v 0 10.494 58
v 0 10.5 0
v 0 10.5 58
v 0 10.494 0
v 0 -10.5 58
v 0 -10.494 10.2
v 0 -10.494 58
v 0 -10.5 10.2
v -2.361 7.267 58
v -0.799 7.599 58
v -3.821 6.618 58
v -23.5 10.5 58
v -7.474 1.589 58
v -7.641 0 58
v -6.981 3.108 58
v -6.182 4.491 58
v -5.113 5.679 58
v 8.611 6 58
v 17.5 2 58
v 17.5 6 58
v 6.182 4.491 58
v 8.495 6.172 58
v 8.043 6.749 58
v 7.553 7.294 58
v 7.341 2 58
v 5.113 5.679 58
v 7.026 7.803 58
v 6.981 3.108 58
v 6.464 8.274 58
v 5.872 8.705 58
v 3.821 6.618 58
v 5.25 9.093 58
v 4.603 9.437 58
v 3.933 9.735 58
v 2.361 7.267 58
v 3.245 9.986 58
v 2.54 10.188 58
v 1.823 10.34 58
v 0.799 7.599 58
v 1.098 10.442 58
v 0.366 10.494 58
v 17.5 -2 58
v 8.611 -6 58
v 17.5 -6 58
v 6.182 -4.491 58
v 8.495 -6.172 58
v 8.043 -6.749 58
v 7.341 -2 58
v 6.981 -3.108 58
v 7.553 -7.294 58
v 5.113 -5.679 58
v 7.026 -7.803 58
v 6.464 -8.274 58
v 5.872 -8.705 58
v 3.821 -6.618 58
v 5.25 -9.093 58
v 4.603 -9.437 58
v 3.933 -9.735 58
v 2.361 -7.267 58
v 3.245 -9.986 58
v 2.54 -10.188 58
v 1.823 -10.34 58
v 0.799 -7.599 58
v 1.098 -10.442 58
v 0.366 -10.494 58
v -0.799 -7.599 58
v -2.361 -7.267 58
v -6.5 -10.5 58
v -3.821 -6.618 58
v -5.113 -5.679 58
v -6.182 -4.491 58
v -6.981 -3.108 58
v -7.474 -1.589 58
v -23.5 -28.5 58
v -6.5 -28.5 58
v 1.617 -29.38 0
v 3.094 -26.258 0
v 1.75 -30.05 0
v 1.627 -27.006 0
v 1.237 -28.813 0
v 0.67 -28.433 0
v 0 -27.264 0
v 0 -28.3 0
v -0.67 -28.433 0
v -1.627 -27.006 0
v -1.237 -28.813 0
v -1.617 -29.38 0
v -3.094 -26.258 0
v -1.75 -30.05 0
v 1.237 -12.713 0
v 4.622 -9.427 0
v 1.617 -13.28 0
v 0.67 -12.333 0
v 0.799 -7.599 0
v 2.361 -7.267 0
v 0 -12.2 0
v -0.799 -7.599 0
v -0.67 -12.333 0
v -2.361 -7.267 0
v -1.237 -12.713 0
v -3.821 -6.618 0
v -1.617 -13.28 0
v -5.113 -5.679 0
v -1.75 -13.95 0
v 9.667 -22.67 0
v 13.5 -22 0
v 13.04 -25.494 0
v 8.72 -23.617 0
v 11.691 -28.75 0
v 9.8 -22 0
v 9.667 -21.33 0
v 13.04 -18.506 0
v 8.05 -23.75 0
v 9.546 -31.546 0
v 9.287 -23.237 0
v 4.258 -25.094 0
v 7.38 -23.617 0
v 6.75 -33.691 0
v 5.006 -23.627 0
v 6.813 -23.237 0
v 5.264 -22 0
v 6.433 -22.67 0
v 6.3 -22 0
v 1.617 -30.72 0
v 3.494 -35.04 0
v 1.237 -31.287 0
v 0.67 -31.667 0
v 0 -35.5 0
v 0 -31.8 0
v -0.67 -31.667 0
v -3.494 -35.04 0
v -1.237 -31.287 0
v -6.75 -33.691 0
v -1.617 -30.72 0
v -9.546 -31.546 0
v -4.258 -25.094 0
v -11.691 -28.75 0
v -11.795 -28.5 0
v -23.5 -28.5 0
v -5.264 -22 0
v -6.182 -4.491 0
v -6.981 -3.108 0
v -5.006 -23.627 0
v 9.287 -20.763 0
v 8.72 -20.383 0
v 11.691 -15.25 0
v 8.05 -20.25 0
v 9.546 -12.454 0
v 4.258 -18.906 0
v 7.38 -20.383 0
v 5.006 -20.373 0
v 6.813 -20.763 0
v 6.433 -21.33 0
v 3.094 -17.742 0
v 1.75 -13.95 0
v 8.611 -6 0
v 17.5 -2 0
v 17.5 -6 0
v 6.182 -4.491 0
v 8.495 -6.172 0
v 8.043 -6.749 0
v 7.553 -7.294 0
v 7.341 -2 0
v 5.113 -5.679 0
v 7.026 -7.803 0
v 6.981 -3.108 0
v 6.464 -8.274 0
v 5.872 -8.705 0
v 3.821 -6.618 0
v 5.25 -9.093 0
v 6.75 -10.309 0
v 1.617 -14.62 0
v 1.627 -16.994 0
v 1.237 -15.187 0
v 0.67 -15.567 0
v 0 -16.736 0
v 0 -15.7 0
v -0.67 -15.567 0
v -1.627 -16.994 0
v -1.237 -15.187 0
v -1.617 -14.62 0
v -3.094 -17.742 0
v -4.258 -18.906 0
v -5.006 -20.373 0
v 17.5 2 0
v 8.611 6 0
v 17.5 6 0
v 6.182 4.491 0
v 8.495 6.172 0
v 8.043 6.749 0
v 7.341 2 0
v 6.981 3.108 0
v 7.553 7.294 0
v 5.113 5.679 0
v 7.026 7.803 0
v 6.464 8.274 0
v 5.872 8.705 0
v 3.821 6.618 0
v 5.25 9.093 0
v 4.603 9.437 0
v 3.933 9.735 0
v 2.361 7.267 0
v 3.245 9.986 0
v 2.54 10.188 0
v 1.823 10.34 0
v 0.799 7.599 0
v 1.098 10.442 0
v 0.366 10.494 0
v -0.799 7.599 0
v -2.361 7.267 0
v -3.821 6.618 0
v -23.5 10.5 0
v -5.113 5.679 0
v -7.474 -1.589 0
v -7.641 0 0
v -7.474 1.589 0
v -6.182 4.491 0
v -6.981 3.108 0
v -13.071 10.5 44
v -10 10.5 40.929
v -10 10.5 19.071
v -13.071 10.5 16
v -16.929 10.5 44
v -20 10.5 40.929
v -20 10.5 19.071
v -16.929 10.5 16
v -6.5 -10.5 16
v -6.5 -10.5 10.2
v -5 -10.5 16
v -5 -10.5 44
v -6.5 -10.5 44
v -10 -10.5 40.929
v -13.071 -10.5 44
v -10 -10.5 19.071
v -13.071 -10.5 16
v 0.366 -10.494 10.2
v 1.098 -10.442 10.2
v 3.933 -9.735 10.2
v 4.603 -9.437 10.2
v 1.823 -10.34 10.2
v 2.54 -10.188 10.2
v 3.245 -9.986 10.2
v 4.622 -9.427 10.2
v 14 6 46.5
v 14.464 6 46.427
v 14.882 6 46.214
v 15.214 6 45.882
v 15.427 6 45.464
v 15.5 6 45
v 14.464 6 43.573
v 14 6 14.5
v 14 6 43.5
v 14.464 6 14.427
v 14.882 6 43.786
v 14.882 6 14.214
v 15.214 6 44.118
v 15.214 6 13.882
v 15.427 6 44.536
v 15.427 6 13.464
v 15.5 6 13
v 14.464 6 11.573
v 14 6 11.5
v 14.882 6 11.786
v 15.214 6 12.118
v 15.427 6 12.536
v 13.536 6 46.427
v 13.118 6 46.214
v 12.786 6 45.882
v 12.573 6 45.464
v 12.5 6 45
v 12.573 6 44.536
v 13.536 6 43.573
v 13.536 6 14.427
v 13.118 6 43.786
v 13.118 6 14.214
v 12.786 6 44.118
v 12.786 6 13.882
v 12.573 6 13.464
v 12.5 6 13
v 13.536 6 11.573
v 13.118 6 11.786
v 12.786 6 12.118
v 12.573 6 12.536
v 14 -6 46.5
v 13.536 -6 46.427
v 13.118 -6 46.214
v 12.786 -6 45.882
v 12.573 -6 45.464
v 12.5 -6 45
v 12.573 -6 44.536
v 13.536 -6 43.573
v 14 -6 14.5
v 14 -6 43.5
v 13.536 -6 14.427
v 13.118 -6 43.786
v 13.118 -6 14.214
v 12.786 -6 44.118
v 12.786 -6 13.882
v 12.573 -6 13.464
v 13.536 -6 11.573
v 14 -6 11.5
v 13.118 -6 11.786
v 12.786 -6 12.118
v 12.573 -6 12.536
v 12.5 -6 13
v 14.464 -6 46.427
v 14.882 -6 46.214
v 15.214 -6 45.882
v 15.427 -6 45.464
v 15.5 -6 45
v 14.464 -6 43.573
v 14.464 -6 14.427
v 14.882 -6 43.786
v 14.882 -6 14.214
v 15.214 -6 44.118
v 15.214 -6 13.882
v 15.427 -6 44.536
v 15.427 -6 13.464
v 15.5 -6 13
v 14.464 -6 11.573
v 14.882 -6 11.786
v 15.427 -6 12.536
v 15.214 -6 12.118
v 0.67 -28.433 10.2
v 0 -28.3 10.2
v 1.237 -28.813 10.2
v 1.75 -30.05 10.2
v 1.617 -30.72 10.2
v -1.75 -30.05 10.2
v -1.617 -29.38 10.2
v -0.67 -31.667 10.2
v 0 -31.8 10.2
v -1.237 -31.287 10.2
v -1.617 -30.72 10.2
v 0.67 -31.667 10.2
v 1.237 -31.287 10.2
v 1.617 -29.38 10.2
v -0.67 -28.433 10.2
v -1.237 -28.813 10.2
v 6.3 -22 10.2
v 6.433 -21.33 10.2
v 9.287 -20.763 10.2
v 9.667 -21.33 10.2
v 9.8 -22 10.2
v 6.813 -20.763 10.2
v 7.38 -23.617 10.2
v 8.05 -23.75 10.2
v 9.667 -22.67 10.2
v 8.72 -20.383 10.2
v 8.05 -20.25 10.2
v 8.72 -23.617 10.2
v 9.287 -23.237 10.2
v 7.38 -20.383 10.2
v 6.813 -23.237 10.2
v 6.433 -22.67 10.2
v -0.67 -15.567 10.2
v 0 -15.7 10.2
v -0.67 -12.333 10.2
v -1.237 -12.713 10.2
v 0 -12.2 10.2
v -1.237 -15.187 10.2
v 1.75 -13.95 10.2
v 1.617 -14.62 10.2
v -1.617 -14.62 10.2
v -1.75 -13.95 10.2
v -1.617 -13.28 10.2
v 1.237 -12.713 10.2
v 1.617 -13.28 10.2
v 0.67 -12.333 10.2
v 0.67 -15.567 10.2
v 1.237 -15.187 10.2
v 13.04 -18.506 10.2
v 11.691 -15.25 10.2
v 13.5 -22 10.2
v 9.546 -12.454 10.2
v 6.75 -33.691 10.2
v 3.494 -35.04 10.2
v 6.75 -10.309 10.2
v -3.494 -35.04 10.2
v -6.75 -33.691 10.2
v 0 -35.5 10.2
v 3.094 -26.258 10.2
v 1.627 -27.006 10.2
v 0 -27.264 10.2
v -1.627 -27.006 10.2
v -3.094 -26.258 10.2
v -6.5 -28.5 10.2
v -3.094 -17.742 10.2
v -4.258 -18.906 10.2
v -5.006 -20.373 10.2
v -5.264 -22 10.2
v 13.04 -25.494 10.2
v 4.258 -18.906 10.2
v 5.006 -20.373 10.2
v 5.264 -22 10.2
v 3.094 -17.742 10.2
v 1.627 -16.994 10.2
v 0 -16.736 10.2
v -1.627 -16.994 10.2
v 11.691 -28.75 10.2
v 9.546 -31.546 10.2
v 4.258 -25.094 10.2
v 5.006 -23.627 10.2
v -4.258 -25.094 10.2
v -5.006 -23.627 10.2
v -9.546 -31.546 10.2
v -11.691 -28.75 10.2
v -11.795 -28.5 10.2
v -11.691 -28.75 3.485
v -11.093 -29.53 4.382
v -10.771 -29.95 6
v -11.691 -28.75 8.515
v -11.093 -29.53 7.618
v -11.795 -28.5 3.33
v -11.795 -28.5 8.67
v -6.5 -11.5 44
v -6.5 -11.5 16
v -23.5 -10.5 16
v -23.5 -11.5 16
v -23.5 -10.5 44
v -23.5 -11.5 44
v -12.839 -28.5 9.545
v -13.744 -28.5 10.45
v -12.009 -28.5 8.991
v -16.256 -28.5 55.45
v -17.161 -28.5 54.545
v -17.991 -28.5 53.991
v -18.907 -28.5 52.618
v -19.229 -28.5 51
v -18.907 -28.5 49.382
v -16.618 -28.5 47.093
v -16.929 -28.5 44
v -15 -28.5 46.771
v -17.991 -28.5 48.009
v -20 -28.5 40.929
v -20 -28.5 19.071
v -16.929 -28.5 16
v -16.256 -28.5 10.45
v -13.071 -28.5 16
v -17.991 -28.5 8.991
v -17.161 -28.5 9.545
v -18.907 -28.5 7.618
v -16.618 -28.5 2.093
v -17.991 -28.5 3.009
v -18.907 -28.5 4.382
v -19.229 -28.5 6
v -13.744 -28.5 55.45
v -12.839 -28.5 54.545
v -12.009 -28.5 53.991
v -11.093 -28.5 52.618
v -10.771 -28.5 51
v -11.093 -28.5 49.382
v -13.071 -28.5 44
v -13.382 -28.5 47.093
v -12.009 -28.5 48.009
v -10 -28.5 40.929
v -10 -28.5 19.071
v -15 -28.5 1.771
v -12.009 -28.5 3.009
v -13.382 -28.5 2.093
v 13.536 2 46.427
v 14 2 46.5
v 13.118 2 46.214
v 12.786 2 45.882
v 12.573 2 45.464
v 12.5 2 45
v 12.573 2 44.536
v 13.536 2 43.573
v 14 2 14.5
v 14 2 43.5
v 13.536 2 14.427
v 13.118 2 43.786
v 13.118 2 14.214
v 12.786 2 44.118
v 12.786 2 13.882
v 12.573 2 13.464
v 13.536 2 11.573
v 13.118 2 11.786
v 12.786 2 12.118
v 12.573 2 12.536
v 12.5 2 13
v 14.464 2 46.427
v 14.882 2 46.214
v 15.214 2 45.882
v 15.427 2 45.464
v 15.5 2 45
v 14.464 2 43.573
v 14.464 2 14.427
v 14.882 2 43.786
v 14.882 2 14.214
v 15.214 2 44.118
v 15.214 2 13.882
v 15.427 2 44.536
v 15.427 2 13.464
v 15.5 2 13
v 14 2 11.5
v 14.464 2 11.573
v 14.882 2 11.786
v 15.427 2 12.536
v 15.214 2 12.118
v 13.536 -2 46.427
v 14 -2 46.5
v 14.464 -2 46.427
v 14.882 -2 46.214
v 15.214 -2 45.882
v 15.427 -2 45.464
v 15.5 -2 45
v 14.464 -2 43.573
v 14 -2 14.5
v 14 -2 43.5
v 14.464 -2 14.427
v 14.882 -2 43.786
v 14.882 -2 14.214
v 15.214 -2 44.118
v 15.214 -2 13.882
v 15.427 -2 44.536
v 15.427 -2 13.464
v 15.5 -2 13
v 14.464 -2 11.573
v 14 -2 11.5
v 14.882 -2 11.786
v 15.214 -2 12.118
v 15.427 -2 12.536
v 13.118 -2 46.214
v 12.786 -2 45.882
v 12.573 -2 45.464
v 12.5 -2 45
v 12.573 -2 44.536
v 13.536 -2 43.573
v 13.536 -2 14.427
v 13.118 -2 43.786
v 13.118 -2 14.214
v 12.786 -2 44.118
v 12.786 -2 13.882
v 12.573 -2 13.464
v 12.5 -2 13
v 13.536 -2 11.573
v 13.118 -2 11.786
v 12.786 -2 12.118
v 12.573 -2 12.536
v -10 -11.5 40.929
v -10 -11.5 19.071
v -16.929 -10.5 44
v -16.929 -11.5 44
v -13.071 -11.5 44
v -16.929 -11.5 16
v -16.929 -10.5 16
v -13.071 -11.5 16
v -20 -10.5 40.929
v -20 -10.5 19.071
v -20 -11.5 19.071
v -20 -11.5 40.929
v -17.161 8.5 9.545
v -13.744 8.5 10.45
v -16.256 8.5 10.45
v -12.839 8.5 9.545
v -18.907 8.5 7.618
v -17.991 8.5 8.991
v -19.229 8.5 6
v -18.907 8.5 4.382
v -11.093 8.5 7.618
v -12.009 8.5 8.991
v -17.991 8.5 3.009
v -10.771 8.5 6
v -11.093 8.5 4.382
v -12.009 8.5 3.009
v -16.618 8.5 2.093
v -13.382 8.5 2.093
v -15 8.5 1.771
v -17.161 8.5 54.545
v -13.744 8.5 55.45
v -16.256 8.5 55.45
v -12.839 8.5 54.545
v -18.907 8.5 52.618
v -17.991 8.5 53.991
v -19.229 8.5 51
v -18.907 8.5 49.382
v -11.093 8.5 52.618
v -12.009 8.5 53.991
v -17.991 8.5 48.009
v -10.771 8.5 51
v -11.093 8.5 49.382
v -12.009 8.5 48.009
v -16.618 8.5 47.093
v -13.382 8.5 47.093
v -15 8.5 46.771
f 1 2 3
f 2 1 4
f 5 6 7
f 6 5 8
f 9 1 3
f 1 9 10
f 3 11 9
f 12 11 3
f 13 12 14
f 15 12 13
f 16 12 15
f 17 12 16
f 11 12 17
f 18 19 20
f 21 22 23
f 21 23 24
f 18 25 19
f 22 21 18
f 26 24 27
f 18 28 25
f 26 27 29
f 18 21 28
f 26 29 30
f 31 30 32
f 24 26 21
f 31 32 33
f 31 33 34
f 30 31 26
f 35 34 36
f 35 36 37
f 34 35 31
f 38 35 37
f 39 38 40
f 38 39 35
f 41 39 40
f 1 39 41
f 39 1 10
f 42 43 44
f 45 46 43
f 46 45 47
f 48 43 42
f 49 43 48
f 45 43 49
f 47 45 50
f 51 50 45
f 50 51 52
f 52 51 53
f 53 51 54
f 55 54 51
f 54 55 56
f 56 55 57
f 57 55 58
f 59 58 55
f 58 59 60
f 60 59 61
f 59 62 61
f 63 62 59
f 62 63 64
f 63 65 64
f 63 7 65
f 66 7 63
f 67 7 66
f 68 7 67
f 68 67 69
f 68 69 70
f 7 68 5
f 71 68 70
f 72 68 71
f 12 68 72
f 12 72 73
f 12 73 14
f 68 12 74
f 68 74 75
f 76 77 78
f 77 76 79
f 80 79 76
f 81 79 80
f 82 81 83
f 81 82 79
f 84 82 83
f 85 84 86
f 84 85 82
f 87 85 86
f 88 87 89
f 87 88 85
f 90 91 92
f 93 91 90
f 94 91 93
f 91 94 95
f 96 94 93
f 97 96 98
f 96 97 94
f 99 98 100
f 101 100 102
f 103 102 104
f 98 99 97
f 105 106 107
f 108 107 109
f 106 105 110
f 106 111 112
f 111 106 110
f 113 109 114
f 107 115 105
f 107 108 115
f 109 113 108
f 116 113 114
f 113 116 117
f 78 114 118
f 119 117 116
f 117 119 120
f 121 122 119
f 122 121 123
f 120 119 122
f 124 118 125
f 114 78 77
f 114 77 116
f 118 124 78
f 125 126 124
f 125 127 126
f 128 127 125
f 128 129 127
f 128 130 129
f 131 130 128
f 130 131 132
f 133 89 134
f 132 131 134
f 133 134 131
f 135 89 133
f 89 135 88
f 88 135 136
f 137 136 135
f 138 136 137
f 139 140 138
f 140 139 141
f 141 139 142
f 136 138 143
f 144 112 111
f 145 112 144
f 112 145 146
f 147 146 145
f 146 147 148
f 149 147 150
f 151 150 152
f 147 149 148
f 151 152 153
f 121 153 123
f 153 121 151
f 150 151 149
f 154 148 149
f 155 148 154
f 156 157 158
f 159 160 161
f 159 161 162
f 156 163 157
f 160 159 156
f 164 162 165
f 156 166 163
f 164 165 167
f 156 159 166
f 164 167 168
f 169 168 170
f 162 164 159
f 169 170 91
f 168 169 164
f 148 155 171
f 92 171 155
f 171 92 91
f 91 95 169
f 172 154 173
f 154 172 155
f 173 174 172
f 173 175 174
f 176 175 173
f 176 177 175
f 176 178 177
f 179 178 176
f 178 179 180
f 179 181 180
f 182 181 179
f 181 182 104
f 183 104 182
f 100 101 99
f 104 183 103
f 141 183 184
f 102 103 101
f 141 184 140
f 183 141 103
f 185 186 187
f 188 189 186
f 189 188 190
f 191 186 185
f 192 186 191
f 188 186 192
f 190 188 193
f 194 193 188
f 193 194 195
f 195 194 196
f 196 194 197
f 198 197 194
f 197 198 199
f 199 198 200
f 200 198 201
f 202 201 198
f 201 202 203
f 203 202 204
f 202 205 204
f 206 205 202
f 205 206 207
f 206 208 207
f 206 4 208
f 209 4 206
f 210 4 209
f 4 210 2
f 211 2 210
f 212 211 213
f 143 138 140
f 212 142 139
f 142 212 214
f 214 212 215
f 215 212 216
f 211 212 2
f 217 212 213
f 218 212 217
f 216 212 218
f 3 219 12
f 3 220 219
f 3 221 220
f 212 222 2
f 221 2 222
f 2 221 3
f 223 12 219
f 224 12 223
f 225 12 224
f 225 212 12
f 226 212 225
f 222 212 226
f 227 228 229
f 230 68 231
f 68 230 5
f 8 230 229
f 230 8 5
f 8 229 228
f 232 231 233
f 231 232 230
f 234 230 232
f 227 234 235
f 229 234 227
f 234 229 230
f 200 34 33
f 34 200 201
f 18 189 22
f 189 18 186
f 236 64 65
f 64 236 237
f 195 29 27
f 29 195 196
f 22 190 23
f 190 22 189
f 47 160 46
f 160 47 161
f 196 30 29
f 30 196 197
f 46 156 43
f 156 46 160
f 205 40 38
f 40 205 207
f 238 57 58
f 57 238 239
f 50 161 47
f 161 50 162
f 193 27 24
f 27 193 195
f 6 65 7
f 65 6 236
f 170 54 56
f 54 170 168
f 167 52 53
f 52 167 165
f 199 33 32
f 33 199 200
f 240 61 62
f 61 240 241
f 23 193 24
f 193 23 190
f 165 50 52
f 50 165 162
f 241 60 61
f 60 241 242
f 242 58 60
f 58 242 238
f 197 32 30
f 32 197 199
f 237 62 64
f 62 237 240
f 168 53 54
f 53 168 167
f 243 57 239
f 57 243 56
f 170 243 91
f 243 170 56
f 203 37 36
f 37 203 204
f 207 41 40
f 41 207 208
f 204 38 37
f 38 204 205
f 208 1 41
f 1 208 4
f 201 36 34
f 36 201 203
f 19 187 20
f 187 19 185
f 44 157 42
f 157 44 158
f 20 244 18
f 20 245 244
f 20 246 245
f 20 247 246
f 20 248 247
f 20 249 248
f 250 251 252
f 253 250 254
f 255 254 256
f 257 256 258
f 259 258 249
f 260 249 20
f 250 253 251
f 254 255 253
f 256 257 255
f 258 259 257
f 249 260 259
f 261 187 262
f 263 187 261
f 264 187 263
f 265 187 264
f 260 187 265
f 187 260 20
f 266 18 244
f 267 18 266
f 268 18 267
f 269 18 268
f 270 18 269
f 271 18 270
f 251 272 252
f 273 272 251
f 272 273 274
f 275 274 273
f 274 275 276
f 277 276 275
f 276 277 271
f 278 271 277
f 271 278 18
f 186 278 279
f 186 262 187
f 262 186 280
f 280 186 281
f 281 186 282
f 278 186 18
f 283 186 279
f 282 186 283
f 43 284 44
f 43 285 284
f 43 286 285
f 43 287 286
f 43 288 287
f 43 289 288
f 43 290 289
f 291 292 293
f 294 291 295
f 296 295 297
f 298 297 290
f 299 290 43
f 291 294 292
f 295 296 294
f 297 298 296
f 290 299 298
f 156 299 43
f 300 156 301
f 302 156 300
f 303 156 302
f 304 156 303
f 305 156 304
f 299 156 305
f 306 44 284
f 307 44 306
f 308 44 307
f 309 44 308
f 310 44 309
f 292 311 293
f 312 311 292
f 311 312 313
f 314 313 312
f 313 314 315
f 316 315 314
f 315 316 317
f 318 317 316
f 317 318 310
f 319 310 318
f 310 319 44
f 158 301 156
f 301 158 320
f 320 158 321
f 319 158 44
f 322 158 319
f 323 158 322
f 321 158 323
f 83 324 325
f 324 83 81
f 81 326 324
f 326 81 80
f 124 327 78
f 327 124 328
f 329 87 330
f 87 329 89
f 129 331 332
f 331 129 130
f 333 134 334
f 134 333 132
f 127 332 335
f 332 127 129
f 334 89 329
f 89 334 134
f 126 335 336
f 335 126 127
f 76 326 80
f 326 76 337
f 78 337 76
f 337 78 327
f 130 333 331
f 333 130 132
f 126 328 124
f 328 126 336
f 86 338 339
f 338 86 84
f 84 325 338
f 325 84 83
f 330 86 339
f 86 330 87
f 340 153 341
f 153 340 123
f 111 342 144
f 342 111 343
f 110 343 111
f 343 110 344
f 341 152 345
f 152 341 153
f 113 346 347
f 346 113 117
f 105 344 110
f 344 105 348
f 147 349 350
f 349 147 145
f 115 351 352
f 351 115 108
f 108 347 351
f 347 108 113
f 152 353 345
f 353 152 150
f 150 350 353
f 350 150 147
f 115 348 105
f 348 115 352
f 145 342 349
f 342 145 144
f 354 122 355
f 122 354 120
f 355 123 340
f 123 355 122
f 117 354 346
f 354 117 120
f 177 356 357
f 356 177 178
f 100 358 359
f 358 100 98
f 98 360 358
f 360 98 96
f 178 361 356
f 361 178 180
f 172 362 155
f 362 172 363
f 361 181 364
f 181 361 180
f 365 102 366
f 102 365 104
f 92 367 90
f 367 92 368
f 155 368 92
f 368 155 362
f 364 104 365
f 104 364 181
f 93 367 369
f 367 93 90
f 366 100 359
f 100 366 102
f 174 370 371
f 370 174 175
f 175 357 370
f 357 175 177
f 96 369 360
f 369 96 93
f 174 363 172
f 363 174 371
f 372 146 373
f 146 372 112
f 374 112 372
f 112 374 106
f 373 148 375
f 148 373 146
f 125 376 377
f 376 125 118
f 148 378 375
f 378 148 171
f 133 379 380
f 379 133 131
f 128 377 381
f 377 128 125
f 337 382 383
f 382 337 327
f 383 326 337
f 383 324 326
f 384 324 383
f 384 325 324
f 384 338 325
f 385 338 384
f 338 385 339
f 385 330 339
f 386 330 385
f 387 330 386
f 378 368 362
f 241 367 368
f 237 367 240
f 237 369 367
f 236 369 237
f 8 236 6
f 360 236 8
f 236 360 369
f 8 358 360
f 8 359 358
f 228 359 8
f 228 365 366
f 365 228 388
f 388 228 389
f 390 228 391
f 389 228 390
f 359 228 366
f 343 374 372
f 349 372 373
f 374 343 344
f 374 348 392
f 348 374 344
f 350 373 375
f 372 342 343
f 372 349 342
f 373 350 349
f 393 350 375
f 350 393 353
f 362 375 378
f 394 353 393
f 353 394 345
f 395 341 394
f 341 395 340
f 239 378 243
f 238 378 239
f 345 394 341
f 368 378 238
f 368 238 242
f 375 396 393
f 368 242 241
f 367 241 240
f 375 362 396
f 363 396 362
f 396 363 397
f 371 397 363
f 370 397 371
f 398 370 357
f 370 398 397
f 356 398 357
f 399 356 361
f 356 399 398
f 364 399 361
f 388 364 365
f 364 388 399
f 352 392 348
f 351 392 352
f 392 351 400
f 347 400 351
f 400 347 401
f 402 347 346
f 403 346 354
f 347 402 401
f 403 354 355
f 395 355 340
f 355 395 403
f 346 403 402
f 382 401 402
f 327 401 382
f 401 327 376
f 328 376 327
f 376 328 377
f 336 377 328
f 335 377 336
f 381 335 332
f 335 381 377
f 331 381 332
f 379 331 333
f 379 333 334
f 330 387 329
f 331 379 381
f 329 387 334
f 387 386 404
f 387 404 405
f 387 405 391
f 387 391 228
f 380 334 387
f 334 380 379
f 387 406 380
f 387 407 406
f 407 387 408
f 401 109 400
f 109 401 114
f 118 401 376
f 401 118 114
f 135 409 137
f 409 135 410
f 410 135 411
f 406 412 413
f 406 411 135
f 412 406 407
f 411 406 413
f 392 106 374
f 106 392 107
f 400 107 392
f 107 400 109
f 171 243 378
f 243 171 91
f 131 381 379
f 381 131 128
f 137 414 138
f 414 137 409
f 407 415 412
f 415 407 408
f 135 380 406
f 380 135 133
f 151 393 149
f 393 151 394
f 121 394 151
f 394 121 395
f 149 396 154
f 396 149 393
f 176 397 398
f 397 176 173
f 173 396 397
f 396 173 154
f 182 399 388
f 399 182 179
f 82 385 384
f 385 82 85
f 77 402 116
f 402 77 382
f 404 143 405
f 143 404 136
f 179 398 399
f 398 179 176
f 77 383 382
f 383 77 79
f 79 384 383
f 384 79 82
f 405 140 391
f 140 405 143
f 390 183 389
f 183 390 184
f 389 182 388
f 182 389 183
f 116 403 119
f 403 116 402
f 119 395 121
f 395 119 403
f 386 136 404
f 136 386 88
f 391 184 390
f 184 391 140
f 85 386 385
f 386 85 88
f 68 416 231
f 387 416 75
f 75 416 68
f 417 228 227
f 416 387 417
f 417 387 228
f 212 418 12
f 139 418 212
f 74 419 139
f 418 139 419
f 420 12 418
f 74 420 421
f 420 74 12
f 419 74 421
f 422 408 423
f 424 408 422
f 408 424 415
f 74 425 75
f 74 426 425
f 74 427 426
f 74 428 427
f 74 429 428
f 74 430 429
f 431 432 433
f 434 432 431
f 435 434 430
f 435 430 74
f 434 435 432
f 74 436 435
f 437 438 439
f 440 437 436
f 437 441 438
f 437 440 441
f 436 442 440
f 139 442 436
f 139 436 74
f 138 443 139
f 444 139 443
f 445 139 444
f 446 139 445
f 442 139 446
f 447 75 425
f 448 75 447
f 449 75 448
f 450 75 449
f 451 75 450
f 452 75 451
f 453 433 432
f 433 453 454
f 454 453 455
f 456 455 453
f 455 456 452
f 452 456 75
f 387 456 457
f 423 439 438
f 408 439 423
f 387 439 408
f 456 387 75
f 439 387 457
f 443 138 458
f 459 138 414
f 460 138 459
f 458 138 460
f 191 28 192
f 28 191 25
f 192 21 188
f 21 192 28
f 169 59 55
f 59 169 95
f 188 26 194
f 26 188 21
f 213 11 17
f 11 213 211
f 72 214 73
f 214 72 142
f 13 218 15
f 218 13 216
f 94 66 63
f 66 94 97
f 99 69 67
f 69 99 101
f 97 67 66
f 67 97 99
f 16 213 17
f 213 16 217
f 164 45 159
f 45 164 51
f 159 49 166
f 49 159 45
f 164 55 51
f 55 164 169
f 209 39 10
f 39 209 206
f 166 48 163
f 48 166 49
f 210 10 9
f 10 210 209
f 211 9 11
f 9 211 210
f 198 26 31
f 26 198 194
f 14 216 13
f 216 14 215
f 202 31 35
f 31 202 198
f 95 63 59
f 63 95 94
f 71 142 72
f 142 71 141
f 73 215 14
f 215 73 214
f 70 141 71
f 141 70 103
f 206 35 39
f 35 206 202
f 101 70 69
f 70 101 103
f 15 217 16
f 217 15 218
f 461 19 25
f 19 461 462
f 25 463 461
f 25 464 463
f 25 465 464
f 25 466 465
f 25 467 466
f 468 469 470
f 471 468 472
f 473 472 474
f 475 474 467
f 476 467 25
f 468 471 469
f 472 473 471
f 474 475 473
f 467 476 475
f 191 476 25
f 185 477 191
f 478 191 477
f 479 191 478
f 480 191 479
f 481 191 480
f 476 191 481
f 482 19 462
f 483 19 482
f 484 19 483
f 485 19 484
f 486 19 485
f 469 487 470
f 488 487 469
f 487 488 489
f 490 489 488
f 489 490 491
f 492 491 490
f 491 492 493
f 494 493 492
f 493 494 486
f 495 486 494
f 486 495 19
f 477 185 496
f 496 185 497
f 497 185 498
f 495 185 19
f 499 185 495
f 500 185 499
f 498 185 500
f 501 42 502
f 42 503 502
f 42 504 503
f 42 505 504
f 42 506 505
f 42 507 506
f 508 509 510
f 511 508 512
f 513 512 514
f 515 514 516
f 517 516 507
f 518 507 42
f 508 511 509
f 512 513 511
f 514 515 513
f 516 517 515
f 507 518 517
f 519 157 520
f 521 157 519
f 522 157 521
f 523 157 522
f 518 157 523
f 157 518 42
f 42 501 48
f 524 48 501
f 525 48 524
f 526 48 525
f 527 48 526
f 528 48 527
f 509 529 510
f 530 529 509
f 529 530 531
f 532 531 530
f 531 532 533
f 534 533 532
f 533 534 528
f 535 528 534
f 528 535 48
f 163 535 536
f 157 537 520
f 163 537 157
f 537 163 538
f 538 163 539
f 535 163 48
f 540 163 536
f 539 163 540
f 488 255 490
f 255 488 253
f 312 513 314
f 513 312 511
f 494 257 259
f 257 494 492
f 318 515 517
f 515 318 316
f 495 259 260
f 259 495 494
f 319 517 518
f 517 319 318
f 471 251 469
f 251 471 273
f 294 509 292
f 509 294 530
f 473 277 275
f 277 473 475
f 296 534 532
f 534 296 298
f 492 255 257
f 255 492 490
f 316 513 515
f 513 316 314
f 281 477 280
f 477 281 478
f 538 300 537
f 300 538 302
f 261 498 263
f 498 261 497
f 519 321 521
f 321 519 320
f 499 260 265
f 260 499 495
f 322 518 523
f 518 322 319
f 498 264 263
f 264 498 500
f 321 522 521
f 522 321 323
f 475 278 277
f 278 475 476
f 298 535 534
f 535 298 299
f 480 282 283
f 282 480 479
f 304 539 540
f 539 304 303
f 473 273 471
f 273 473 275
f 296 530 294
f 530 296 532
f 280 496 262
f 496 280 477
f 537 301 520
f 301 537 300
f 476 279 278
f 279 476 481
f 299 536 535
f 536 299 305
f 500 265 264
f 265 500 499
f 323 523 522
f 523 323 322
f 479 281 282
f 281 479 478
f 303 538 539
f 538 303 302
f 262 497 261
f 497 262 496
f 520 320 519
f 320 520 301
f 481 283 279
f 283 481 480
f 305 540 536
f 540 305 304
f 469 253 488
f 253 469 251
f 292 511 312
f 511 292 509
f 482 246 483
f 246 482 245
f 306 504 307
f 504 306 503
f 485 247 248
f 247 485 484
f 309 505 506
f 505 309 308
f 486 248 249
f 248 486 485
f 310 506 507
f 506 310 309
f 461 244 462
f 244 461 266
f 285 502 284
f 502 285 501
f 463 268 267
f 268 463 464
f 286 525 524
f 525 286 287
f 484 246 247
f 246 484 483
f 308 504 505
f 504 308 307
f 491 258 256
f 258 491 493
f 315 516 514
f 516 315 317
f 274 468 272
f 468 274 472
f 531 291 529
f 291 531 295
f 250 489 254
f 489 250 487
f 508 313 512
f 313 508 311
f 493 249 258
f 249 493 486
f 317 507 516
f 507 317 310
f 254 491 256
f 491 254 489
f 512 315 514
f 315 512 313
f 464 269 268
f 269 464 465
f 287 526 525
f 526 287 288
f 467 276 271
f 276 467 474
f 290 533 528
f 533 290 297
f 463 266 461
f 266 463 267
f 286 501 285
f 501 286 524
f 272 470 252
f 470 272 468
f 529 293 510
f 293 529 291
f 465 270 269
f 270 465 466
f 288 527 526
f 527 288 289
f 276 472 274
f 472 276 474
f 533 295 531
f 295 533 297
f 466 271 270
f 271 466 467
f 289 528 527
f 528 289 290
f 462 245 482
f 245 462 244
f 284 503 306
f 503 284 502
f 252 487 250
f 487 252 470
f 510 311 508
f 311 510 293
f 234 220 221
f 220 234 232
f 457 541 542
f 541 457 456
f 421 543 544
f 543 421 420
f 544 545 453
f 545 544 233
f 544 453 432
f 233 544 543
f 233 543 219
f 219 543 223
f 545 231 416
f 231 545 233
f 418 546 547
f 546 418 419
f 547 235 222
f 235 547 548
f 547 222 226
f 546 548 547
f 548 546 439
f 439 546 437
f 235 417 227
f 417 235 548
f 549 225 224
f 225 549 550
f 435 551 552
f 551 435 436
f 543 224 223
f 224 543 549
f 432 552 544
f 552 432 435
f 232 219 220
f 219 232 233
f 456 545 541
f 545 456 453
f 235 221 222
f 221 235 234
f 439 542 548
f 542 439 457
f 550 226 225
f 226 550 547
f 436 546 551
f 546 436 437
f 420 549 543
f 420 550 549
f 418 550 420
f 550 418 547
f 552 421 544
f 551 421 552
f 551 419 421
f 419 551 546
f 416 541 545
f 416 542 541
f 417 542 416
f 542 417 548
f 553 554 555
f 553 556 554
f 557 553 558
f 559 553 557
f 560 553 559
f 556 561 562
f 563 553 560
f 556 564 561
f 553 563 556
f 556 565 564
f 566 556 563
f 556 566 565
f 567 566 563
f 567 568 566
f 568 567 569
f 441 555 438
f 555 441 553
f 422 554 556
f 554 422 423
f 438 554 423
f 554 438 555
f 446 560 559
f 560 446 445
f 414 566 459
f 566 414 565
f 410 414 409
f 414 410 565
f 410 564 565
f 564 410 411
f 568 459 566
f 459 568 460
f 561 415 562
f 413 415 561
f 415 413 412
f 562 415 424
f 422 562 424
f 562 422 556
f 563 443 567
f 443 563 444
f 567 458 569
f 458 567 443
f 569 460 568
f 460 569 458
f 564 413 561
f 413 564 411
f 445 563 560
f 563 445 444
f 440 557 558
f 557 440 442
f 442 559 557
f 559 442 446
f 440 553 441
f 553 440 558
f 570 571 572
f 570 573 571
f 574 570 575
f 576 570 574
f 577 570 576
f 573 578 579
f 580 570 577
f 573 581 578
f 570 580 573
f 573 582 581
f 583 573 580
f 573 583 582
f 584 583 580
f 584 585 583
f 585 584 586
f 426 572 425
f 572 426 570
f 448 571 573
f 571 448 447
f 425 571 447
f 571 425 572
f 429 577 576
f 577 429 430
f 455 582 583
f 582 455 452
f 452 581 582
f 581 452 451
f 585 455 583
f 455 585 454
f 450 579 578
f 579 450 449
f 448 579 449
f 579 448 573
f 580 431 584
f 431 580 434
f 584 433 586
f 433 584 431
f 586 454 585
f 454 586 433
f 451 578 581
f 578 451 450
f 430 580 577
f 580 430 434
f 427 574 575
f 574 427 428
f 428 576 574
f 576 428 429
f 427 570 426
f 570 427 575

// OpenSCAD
// file: polyholes.scad
//
// Mendel90
//
// GNU GPL v2
// nop.head@gmail.com
// hydraraptor.blogspot.com
//
// See http://hydraraptor.blogspot.com/2011/02/polyholes.html
//
function sides(r)=max(round(4 *r),3);
function correctedRadius(r,n)=0.1 + r / cos(180 / n);
function correctedDiameter(d)=0.2 + d / cos(180 / sides(d / 2));

module polyCircle(r, center=false) {
    n=sides(r);
    circle(r=correctedRadius(r,n), $fn=n, center=center);
}

module poly_circle(r, center=false) {
	polyCircle(r, center);
}

module polyCylinder(r, h, center=false) {
    n=sides(r);
    cylinder(h=h, r=correctedRadius(r,n), $fn=n, center=center);
}

module poly_cylinder(r, h, center=false) {
	polyCylinder(r,h,center);
}

module polydCylinder(r, center=false) {
    n=sides(r);
    r=correctedRadius(r,n);
    cylinder(h=h, r=r, $fn=n, center=center);
    translate([0, -r, 0])
        cube([r, 2 * r, h]);
}

module poly_d_cylinder(r, center=false) {
	polydCylinder(r,center);
}
// file: bearing.scad
// PRUSA iteration3
// Bearing holders
// GNU GPL v3
// Josef Průša <iam@josefprusa.cz> and contributors
// http://www.reprap.org/wiki/Prusa_Mendel
// http://prusamendel.org

use <polyholes.scad>

bearing_diameter = 15;

module horizontal_bearing_base(bearings=1){
 translate(v=[0,0,6]) cube(size = [24,8+bearings*25,12], center = true);	
}
module horizontal_bearing_holes(bearings=1){
 cutter_lenght = 10+bearings*25;
 one_holder_lenght = 8+25;
 holder_lenght = 8+bearings*25;
 
 // Main bearing cut
 difference(){
  translate(v=[0,0,12]) rotate(a=[90,0,0]) translate(v=[0,0,-cutter_lenght/2]) cylinder(h = cutter_lenght, r=bearing_diameter/2, $fn=50);
  // Bearing retainers
  translate(v=[0,1-holder_lenght/2,3]) cube(size = [24,6,8], center = true);
  translate(v=[0,-1+holder_lenght/2,3]) cube(size = [24,6,8], center = true);
 }
 
 // Ziptie cutouts
 ziptie_cut_ofset = 0;
 for ( i = [0 : bearings-1] ){
  // For easier positioning I move them by half of one 
  // bearing holder then add each bearign lenght and then center again
  translate(v=[0,-holder_lenght/2,0]) translate(v=[0,one_holder_lenght/2+i*25,0]) difference(){
   union(){
    translate(v=[0,2-6,12]) rotate(a=[90,0,0]) translate(v=[0,0,0]) cylinder(h = 4, r=12.5, $fn=50);
    translate(v=[0,2+6,12]) rotate(a=[90,0,0]) translate(v=[0,0,0]) cylinder(h = 4, r=12.5, $fn=50);
   }
   translate(v=[0,10,12]) rotate(a=[90,0,0]) translate(v=[0,0,0]) cylinder(h = 24, r=10, $fn=50);
  }
 }
 
}

module horizontal_bearing_test(){
 difference(){
  horizontal_bearing_base(1);
  horizontal_bearing_holes(1);
 }
 translate(v=[30,0,0]) difference(){
  horizontal_bearing_base(2);
  horizontal_bearing_holes(2);
 }
 translate(v=[60,0,0]) difference(){
  horizontal_bearing_base(3);
  horizontal_bearing_holes(3);
 }
}



thinwall = 3;
bearing_size = bearing_diameter + 2 * thinwall;

module vertical_bearing_base(){
 translate(v=[-2-bearing_size/4,0,29]) cube(size = [4+bearing_size/2,bearing_size,58], center = true);
 cylinder(h = 58, r=bearing_size/2, $fn = 90);
 translate(v=[(bearing_size/2)+2,0,29]) cube([10,12,58], center=true);
}

module vertical_bearing_holes(){
  height = 58;
  translate(v=[0,0,-1]) poly_cylinder(h = height+2, r=bearing_diameter/2);
  // translate(v=[0,0,24]) poly_cylinder(h = height-(24*2), r=bearing_diameter/2);
  translate(v=[bearing_diameter/2-1,-4/2,-1]) cube(size = [(thinwall*2)+8,4,62]);
  rotate([90,0,0]) translate([14,13,0]) cylinder(d=3, h=15, center=true, $fn = 20);
  rotate([90,0,0]) translate([14,height-13,0]) cylinder(d=3, h=15, center=true, $fn = 20);
}

difference(){
  vertical_bearing_base();
  vertical_bearing_holes();
}
// main file
// PRUSA iteration3
// X end prototype
// GNU GPL v3
// Josef Průša <iam@josefprusa.cz> and contributors
// http://www.reprap.org/wiki/Prusa_Mendel
// http://prusamendel.org

use <bearing.scad>
use <polyholes.scad>
rod_distance=45;

module x_end_base()
{
    // Main block
    height=58;
    translate([-15,-9,height/2]) cube([17,39,height], center=true);

    // Bearing holder
    vertical_bearing_base();

    // Nut trap
    translate([0, -17-5, 0]) {
        difference() {
            // Hexagon
            cylinder(h=10.2, d=27, $fn=24);
            // Nut trap
            translate([0, 0, -0.5]) poly_cylinder(h=16, r=5.1, $fn=25);
            for (a=[0:90:269]) {
                rotate([0,0,a-90]) translate([(22/2)-(3.5/2)-1.2,0,-6]) cylinder(d=3.5, h=20, $fn=16);
            }
        }
    }
}

module x_end_holes()
{
    vertical_bearing_holes();

    // Belt hole
    translate([-1,0,0]) {

        // Stress relief
        translate([-5.5-10+1.5, -10-1, 30]) cube([20,1,28], center=true);
        difference() {
            translate([-5.5-10+1.5, -10, 30]) cube([10,46,28], center=true);

            // Nice edges
            translate([-5.5-10+1.5, -10, 30+23]) rotate([0, +45, 0]) cube([10, 46, 28], center=true);
            translate([-5.5-10+1.5, -10, 30+23]) rotate([0, -45, 0]) cube([10, 46, 28], center=true);
            translate([-5.5-10+1.5, -10, 30-23]) rotate([0, +45, 0]) cube([10, 46, 28], center=true);
            translate([-5.5-10+1.5, -10, 30-23]) rotate([0, -45, 0]) cube([10, 46, 28], center=true);
        }
    }

    // Bottom pushfit rod
    translate([-15, -41.5, 6]) rotate(a=[-90, 0, 0]) pushfit_rod(8.1, 50);

    // Top pushfit rod
    translate([-15, -41.5, rod_distance+6]) rotate(a=[-90, 0, 0]) pushfit_rod(8.1, 50);
}

module pushfit_rod(diameter,length)
{
    poly_cylinder(h=length, r=diameter/2);
    difference() {
        translate([0, -diameter/2.85, length/2]) rotate([0,0,45]) cube([diameter/2, diameter/2, length], center=true);
        translate([0, -diameter/4-diameter/2-0.4, length/2]) rotate([0,0,0]) cube([diameter, diameter/2, length], center=true);
    }
    // translate([0,-diameter/2-2,length/2]) cube([diameter,1,length], center=true);
}

// Final prototype
module x_end_plain()
{
    difference() {
        x_end_base();
        x_end_holes();
    }
}

x_end_plain();
